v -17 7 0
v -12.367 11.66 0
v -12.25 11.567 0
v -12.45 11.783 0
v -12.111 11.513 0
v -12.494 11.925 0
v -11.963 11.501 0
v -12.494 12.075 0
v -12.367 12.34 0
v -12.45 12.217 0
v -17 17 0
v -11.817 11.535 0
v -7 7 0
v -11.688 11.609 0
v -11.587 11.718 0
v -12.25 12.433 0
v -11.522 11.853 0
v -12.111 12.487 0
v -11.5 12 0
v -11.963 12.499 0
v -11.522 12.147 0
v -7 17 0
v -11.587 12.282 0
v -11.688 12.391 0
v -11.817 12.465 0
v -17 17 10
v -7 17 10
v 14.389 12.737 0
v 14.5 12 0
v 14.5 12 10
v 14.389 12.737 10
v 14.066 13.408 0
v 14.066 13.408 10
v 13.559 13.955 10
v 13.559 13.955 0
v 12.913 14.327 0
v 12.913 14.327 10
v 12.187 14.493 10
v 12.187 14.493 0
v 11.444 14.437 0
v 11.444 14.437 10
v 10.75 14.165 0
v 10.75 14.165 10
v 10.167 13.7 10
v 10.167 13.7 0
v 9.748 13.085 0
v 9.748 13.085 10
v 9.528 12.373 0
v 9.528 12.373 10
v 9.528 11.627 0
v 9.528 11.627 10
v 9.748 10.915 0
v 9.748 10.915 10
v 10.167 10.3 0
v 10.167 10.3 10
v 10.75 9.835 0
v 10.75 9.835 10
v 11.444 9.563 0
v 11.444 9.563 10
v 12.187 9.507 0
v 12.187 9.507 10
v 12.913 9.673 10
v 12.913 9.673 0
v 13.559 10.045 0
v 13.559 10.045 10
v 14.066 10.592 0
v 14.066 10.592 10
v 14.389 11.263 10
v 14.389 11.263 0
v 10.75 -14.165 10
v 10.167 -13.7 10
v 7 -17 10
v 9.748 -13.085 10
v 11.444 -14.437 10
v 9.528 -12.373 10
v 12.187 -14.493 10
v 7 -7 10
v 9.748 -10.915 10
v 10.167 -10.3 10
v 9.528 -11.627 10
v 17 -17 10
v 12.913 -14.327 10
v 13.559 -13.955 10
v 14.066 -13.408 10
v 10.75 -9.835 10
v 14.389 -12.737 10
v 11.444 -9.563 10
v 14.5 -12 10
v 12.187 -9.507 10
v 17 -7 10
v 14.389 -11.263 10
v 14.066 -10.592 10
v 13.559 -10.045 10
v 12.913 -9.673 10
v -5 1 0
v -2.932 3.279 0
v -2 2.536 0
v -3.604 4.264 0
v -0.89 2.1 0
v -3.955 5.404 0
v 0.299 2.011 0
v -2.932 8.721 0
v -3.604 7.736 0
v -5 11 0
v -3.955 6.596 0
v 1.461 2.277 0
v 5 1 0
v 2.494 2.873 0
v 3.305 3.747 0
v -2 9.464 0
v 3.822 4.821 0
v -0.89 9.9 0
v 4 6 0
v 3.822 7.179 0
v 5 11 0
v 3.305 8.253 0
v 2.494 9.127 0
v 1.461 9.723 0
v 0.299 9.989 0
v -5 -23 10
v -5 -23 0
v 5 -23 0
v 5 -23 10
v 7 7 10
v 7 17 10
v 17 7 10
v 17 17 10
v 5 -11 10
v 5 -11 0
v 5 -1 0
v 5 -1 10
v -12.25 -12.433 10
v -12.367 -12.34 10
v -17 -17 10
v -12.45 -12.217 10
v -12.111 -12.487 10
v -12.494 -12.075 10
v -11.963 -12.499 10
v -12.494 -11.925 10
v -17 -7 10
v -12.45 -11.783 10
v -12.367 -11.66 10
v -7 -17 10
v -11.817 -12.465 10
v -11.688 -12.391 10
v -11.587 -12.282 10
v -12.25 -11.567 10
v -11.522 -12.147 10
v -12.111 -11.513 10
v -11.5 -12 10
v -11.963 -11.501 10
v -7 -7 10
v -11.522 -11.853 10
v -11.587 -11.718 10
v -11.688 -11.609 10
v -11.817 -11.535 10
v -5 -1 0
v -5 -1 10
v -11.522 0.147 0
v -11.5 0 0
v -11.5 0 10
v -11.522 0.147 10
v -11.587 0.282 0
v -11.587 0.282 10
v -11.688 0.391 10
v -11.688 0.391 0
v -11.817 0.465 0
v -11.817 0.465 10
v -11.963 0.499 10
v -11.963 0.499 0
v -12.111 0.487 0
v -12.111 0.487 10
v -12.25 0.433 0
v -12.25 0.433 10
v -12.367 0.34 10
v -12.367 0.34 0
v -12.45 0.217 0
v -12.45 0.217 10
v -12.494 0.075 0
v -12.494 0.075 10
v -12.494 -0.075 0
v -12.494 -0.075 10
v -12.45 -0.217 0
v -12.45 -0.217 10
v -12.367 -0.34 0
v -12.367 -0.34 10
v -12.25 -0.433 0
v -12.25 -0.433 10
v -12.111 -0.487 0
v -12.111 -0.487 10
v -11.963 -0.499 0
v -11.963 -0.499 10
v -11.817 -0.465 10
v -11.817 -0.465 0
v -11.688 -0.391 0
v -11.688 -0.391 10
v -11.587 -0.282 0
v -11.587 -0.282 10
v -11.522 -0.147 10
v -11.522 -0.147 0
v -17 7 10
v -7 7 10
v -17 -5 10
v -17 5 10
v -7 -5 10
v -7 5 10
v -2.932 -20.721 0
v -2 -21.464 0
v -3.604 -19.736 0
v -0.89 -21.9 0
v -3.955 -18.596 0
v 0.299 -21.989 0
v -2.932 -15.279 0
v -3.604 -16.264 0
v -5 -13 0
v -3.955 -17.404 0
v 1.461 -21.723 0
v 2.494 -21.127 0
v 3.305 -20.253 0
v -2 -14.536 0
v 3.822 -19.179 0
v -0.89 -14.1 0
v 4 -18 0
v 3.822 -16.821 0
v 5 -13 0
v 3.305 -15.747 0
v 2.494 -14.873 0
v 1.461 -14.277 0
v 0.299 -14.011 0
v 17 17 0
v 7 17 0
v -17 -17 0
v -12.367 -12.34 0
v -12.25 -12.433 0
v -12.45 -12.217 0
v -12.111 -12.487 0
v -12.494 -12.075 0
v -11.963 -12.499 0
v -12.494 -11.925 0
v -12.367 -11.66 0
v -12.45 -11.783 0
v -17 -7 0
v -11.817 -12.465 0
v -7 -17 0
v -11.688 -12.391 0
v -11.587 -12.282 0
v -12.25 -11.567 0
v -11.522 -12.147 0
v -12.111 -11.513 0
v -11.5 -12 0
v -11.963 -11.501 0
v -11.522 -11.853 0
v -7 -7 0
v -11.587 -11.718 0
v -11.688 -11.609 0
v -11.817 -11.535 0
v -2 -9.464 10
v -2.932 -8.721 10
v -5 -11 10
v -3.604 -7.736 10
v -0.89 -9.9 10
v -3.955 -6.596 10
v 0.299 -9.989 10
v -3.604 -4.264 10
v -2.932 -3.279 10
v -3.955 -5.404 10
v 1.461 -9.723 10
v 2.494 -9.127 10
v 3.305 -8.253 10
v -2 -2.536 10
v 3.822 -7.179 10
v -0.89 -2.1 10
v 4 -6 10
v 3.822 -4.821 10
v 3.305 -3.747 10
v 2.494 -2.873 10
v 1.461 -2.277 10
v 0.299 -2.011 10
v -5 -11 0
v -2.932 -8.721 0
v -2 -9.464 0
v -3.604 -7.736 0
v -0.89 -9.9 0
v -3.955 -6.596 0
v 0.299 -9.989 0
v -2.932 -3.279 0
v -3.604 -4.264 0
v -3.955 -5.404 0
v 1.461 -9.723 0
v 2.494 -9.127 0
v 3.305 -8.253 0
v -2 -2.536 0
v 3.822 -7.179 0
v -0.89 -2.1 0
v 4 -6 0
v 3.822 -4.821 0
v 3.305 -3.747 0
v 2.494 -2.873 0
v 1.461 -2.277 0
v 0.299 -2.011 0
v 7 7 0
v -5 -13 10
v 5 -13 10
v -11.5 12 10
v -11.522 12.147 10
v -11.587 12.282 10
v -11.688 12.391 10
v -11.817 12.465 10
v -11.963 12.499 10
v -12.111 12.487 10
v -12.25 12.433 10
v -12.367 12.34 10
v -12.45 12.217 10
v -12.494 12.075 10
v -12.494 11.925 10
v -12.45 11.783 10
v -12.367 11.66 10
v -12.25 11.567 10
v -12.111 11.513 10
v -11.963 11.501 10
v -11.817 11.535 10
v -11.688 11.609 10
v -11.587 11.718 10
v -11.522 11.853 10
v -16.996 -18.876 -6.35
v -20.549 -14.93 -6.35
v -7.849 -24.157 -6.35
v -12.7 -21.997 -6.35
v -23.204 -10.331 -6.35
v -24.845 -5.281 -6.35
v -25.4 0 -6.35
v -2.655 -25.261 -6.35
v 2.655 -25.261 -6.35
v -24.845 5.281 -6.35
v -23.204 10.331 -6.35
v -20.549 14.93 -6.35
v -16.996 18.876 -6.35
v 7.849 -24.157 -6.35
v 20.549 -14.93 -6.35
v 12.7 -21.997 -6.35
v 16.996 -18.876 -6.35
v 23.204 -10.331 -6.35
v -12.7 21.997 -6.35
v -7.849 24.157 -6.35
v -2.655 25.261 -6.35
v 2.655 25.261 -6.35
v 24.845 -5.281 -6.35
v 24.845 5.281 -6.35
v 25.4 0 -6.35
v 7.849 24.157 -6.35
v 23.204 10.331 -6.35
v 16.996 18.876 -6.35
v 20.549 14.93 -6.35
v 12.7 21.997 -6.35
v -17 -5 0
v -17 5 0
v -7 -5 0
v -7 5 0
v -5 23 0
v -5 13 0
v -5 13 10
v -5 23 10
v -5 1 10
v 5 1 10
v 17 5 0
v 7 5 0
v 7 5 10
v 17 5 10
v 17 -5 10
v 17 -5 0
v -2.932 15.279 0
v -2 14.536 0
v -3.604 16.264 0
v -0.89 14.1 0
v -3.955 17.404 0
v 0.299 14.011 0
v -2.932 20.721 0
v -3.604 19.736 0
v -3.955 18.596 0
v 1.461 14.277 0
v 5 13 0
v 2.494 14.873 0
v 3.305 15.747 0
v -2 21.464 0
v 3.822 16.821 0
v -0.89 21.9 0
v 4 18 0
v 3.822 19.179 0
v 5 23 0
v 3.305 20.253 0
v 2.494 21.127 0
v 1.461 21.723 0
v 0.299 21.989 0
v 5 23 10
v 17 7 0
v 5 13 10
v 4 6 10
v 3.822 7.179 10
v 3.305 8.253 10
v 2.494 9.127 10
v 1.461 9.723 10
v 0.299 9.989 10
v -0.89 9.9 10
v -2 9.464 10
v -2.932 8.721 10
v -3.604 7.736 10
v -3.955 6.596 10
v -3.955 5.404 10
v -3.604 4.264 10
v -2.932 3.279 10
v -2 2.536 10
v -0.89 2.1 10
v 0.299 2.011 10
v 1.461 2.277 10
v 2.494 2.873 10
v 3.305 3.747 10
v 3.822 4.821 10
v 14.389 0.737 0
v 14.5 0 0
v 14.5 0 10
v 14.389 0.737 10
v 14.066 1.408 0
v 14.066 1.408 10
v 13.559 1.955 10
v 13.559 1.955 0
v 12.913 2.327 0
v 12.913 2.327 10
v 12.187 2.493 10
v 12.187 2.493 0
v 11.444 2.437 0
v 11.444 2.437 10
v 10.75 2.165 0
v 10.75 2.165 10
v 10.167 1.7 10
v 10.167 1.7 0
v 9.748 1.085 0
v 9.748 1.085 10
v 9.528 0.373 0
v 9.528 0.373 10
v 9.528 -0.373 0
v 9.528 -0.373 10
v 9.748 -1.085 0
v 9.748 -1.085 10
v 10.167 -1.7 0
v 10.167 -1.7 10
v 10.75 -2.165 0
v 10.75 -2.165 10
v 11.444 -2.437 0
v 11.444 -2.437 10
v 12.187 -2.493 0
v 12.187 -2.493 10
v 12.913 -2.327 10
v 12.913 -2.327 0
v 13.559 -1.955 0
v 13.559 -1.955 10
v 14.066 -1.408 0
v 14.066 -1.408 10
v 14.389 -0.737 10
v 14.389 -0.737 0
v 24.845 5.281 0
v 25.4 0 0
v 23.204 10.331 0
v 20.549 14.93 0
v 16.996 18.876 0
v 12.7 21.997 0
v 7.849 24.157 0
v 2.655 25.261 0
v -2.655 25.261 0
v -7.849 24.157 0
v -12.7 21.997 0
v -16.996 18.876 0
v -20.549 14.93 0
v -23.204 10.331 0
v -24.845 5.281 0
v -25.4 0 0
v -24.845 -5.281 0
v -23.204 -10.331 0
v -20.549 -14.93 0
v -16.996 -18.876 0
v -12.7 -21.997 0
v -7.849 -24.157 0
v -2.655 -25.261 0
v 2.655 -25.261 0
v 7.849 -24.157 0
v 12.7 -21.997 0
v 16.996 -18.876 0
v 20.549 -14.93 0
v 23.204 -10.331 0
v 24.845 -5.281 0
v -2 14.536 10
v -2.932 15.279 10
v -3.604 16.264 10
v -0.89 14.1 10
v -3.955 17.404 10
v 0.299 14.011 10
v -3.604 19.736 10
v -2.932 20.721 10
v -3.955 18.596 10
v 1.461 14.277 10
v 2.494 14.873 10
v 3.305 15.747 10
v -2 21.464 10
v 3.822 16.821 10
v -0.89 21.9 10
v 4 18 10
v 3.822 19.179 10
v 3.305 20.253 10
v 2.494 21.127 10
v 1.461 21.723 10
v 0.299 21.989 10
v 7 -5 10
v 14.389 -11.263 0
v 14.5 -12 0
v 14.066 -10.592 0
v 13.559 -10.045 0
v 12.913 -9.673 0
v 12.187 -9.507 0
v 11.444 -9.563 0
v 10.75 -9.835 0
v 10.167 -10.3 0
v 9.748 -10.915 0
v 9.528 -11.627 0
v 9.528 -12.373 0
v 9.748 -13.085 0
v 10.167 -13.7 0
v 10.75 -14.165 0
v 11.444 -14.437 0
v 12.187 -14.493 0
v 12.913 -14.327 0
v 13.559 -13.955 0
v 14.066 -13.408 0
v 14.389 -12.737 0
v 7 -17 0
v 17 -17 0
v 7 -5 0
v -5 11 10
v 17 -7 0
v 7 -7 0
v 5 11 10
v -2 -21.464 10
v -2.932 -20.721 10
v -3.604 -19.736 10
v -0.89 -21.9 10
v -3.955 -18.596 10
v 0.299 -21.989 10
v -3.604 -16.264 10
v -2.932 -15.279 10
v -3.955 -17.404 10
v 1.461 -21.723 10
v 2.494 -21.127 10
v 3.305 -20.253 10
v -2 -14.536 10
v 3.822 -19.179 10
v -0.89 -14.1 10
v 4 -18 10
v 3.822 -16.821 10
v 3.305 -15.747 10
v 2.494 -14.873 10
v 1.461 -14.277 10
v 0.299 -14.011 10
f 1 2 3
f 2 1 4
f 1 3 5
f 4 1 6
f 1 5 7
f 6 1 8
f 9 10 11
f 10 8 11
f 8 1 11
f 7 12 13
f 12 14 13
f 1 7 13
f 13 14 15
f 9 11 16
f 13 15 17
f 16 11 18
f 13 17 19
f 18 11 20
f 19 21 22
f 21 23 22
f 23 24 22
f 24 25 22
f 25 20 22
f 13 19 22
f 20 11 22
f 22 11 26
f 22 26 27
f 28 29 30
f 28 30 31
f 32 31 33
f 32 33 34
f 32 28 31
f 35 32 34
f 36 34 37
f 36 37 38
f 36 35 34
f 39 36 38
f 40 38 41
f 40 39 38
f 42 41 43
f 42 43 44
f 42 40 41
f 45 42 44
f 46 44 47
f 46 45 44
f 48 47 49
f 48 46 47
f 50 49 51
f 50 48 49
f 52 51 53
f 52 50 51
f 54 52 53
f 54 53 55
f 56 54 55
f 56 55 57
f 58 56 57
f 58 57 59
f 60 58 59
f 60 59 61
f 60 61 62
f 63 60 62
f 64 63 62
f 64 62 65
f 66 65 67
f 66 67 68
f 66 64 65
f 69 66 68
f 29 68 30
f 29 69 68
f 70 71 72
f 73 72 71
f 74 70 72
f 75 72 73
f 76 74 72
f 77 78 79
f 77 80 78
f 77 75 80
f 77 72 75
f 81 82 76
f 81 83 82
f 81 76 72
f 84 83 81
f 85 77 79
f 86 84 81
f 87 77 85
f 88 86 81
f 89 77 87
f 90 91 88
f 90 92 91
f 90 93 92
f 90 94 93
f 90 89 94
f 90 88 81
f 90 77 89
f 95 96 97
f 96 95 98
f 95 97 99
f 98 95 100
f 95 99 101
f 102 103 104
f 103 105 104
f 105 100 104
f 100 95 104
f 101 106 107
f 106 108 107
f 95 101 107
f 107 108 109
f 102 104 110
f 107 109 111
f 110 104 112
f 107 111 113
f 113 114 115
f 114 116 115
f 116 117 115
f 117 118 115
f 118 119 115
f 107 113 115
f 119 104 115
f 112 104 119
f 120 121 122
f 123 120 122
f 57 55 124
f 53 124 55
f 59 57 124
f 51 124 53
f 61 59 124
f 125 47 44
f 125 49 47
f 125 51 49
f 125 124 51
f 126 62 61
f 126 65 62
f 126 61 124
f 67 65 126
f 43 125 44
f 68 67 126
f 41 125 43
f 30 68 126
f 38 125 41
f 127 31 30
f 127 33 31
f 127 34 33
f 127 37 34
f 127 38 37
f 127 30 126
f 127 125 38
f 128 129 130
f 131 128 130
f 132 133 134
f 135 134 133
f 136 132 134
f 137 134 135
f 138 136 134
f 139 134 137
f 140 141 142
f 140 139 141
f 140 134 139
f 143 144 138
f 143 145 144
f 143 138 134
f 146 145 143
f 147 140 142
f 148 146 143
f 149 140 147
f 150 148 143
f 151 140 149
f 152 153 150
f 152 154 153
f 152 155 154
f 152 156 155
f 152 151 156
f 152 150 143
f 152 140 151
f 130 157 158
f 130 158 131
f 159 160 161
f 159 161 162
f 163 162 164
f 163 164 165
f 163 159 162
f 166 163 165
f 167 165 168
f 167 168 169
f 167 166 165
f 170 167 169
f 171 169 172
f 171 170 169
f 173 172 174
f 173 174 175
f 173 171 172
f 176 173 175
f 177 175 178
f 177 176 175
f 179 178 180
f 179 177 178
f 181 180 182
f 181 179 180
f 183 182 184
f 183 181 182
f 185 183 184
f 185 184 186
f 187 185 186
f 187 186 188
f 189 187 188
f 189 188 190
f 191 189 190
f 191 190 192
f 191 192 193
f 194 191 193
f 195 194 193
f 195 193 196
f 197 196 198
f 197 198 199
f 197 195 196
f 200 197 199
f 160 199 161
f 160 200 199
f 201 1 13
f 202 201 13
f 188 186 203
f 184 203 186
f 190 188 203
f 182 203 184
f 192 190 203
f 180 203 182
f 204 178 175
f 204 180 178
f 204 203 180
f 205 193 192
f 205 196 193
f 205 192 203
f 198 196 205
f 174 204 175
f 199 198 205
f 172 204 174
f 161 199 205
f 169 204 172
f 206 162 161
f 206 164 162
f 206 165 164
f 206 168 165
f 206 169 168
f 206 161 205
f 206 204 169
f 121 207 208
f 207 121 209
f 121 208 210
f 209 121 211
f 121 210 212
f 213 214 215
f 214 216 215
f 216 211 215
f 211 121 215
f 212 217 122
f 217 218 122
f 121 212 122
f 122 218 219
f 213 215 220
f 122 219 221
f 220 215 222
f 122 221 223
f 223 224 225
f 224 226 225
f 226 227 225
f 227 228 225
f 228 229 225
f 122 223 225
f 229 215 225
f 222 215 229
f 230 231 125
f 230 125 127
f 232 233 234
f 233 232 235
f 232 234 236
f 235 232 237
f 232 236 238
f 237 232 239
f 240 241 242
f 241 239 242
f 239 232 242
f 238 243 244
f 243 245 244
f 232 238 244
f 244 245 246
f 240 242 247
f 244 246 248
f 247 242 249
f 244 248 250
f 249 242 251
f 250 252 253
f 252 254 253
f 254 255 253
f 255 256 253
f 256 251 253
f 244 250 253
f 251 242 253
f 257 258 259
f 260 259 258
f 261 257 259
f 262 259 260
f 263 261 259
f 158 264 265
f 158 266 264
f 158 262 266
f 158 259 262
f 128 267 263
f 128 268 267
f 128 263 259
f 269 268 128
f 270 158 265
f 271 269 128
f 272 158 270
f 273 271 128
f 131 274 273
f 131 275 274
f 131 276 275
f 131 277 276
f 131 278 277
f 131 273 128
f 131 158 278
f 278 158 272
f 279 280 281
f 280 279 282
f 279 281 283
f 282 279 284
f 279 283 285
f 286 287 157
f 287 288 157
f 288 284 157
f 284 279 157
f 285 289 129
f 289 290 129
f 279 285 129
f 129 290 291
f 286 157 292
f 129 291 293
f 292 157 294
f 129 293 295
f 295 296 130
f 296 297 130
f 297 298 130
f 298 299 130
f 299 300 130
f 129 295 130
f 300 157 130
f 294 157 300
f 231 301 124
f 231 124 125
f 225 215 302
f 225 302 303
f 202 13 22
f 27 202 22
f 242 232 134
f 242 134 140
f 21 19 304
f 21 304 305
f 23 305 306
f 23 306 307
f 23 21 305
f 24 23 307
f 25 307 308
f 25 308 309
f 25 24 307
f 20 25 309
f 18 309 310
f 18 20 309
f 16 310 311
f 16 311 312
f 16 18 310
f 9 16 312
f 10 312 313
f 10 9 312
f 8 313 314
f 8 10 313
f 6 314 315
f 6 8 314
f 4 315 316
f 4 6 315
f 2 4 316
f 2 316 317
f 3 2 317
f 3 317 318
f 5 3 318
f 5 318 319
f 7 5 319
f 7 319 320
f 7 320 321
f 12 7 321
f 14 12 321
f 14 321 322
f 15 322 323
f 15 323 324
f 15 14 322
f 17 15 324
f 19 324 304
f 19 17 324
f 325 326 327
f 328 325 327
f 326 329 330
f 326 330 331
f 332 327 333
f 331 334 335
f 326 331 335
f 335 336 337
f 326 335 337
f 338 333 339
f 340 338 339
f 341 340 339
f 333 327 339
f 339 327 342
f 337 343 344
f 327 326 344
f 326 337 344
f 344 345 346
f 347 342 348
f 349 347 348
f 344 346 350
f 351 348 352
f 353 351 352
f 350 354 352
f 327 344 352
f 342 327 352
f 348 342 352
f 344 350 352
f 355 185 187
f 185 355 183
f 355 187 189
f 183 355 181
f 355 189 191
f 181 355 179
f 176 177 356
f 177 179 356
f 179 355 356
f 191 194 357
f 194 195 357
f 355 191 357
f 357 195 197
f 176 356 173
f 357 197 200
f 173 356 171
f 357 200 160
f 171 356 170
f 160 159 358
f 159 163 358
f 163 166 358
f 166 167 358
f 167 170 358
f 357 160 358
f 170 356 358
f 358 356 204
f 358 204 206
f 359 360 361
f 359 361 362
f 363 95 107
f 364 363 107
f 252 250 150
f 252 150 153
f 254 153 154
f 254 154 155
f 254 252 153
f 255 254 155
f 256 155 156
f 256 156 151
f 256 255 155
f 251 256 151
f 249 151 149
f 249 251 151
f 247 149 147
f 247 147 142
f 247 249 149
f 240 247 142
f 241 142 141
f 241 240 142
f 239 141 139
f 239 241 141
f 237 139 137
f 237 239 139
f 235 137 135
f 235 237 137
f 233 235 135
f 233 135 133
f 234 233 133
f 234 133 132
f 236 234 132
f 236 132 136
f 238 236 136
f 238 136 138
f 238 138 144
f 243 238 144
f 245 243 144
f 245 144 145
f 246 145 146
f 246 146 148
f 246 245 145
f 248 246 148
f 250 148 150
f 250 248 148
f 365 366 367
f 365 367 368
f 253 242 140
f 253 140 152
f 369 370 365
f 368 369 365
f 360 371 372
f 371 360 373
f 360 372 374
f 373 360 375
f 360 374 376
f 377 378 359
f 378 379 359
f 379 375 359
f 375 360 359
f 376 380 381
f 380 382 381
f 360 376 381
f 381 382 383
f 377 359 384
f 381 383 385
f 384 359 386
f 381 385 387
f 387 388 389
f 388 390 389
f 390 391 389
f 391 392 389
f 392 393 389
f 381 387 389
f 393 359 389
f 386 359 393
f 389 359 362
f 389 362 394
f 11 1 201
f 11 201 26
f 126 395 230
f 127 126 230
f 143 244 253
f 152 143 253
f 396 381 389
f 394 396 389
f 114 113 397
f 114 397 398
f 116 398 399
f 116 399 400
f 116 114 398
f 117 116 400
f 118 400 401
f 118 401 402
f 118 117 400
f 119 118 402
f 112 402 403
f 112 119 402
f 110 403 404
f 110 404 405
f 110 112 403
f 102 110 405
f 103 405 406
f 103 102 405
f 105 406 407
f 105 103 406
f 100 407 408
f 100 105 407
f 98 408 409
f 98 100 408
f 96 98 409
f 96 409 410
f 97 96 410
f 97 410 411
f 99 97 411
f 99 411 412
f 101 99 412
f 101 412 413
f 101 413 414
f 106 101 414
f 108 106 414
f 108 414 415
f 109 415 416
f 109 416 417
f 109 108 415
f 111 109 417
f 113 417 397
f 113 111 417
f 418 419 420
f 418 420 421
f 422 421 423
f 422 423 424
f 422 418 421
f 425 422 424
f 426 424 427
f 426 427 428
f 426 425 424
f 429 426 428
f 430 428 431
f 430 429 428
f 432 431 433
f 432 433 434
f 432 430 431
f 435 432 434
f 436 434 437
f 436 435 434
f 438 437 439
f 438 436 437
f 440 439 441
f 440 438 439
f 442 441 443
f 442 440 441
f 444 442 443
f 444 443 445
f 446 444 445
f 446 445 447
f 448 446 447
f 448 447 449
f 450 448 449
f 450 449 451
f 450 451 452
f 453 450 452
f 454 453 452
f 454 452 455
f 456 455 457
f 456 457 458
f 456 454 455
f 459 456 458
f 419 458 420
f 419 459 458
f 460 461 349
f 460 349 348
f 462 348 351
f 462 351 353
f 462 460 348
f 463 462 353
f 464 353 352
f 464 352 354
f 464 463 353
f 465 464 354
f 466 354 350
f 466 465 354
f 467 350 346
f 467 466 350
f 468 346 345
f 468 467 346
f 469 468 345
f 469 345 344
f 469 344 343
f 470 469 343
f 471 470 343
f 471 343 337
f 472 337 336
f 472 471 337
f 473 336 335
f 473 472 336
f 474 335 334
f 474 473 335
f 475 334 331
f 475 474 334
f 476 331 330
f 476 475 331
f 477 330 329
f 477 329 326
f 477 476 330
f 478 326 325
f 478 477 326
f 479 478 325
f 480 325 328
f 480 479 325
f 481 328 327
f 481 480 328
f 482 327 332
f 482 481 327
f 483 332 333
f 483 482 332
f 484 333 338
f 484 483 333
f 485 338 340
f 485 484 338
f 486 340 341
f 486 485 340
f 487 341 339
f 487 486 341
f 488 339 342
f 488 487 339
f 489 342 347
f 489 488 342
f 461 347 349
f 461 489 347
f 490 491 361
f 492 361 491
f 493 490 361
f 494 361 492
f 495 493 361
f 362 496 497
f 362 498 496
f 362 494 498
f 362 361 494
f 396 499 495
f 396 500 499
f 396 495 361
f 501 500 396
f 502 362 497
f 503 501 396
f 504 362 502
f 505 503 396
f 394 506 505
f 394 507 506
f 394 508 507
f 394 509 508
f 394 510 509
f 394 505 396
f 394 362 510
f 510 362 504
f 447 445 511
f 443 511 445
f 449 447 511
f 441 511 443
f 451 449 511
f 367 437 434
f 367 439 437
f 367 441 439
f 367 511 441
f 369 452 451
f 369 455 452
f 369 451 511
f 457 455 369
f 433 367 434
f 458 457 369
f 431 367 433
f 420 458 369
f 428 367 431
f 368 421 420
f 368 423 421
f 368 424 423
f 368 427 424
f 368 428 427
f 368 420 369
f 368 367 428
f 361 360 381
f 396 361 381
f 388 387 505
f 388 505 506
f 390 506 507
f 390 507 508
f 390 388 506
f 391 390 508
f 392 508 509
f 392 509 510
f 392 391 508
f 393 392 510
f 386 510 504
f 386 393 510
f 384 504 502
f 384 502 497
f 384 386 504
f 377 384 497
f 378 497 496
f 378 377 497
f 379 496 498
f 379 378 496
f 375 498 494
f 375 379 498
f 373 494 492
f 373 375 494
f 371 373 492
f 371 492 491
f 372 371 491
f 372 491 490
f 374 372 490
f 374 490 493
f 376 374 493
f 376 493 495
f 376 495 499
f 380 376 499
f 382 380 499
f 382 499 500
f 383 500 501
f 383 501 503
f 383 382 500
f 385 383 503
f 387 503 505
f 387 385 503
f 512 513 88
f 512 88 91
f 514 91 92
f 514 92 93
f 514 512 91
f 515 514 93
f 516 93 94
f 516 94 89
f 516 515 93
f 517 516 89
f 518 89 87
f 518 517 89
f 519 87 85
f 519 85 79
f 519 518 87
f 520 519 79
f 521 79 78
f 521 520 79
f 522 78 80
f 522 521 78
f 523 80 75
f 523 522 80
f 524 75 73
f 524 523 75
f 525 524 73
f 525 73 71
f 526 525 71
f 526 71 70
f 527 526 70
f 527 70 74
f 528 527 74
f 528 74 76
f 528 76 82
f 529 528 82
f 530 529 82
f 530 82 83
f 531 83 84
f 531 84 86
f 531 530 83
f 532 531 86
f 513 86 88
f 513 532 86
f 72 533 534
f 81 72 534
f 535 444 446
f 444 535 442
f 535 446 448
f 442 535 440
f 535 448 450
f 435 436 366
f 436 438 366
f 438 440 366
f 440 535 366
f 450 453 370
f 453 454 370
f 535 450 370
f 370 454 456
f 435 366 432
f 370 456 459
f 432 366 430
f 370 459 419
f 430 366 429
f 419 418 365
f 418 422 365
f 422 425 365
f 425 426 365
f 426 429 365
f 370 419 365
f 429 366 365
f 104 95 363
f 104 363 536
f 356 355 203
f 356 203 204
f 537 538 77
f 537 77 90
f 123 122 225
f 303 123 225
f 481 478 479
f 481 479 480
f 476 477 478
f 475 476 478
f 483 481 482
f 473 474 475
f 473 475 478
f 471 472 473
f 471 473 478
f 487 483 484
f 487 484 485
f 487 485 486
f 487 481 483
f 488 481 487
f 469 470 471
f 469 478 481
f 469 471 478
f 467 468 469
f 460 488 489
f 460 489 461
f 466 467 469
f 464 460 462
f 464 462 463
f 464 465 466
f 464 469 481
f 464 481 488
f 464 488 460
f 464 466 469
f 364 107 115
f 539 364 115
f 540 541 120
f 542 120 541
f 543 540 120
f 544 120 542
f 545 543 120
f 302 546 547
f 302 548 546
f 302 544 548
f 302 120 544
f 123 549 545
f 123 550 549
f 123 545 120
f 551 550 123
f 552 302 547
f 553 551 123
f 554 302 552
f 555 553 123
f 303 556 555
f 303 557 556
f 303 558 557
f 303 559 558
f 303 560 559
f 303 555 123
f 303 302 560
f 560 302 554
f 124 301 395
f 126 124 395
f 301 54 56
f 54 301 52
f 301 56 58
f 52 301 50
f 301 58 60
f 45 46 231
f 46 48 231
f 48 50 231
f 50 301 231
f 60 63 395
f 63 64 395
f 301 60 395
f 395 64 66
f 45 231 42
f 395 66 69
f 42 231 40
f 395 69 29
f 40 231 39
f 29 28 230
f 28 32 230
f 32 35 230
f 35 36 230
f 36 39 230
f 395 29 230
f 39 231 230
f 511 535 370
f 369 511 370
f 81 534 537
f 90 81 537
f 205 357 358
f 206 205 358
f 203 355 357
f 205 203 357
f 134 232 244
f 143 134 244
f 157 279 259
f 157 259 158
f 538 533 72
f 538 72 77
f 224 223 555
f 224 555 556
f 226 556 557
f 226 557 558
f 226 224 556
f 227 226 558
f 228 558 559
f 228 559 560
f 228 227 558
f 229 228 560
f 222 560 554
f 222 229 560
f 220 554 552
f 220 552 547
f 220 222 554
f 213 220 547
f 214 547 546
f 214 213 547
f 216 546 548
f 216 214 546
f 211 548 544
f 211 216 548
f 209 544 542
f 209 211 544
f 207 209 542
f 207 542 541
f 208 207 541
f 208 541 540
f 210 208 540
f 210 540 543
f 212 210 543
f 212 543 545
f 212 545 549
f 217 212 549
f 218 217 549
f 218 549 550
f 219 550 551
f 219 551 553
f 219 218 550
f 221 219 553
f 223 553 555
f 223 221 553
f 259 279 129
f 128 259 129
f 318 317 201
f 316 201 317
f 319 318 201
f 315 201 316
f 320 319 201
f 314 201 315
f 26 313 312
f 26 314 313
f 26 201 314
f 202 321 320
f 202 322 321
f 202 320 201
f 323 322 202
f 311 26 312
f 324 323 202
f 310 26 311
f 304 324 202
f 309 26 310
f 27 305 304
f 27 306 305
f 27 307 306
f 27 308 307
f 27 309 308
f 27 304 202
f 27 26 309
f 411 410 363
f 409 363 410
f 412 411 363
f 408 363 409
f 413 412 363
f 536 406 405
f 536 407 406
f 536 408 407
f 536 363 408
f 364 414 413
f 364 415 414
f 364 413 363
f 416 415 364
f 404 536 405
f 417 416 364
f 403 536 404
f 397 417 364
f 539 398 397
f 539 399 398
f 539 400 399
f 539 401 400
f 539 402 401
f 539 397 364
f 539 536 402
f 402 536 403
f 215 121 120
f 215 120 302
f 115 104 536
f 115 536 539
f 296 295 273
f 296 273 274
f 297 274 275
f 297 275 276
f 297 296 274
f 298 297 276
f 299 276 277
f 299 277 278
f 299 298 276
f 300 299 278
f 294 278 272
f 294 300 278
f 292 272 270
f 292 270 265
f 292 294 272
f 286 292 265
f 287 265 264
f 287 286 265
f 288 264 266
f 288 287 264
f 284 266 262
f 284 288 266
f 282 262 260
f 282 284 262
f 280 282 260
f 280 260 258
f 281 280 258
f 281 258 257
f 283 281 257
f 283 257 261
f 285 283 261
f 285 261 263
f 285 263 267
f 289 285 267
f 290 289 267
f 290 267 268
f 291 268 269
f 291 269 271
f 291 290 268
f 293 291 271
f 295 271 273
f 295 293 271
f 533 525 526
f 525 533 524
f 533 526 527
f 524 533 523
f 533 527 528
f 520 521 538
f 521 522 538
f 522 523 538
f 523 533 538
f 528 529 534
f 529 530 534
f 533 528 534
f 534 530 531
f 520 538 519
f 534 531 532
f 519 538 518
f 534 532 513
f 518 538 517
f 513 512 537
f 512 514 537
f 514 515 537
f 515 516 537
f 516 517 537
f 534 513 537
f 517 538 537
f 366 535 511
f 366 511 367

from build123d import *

# Parameters (mm, degrees)
F0_R     = 25.4
F0_W     = 10
F0_H     = 10
F0_R_2   = 0.5
F0_R_3   = 4
F0_R_4   = 2.5
F1_DEPTH = 6.35
F2_DEPTH = 10


with BuildPart() as f1:
    # F0 (on Top) → F1 (new body)
    with BuildSketch(Plane.XY):
        Circle(F0_R)
        with Locations((0, -18)):
            Rectangle(F0_W, F0_H, mode=Mode.SUBTRACT)
        with Locations((-12, -12)):
            Rectangle(F0_W, F0_H, mode=Mode.SUBTRACT)
        with Locations((-12, 0)):
            Rectangle(F0_W, F0_H, mode=Mode.SUBTRACT)
        with Locations((0, -6)):
            Rectangle(F0_W, F0_H, mode=Mode.SUBTRACT)
        with Locations((12, -12)):
            Rectangle(F0_W, F0_H, mode=Mode.SUBTRACT)
        with Locations((12, 0)):
            Rectangle(F0_W, F0_H, mode=Mode.SUBTRACT)
        with Locations((0, 6)):
            Rectangle(F0_W, F0_H, mode=Mode.SUBTRACT)
        with Locations((-12, 12)):
            Rectangle(F0_W, F0_H, mode=Mode.SUBTRACT)
        with Locations((0, 18)):
            Rectangle(F0_W, F0_H, mode=Mode.SUBTRACT)
        with Locations((12, 12)):
            Rectangle(F0_W, F0_H, mode=Mode.SUBTRACT)
        with Locations((-12, -12)):
            Rectangle(F0_W, F0_H)
        with Locations((-12, -12)):
            Circle(F0_R_2, mode=Mode.SUBTRACT)
        with Locations((-12, 0)):
            Rectangle(F0_W, F0_H)
        with Locations((-12, 0)):
            Circle(F0_R_2, mode=Mode.SUBTRACT)
        with Locations((-12, 12)):
            Rectangle(F0_W, F0_H)
        with Locations((-12, 12)):
            Circle(F0_R_2, mode=Mode.SUBTRACT)
        with Locations((0, 6)):
            Rectangle(F0_W, F0_H)
        with Locations((0, 6)):
            Circle(F0_R_3, mode=Mode.SUBTRACT)
        with Locations((0, -6)):
            Rectangle(F0_W, F0_H)
        with Locations((0, -6)):
            Circle(F0_R_3, mode=Mode.SUBTRACT)
        with Locations((0, -18)):
            Rectangle(F0_W, F0_H)
        with Locations((0, -18)):
            Circle(F0_R_3, mode=Mode.SUBTRACT)
        with Locations((0, 18)):
            Rectangle(F0_W, F0_H)
        with Locations((0, 18)):
            Circle(F0_R_3, mode=Mode.SUBTRACT)
        with Locations((12, 12)):
            Rectangle(F0_W, F0_H)
        with Locations((12, 12)):
            Circle(F0_R_4, mode=Mode.SUBTRACT)
        with Locations((12, 0)):
            Rectangle(F0_W, F0_H)
        with Locations((12, 0)):
            Circle(F0_R_4, mode=Mode.SUBTRACT)
        with Locations((12, -12)):
            Rectangle(F0_W, F0_H)
        with Locations((12, -12)):
            Circle(F0_R_4, mode=Mode.SUBTRACT)
        with Locations((-12, -12)):
            Circle(F0_R_2)
        with Locations((-12, 0)):
            Circle(F0_R_2)
        with Locations((-12, 12)):
            Circle(F0_R_2)
        with Locations((0, 18)):
            Circle(F0_R_3)
        with Locations((0, 6)):
            Circle(F0_R_3)
        with Locations((0, -18)):
            Circle(F0_R_3)
        with Locations((12, -12)):
            Circle(F0_R_4)
        with Locations((12, 0)):
            Circle(F0_R_4)
        with Locations((12, 12)):
            Circle(F0_R_4)
        with Locations((0, -6)):
            Circle(F0_R_3)
    extrude(amount=-F1_DEPTH)


with BuildPart() as f2:
    # F0 (on Top) → F2 (new body)
    with BuildSketch(Plane.XY):
        with Locations((-12, 12)):
            Rectangle(F0_W, F0_H)
        with Locations((-12, 12)):
            Circle(F0_R_2, mode=Mode.SUBTRACT)
        with Locations((0, 18)):
            Rectangle(F0_W, F0_H)
        with Locations((0, 18)):
            Circle(F0_R_3, mode=Mode.SUBTRACT)
        with Locations((12, 12)):
            Rectangle(F0_W, F0_H)
        with Locations((12, 12)):
            Circle(F0_R_4, mode=Mode.SUBTRACT)
        with Locations((0, 6)):
            Rectangle(F0_W, F0_H)
        with Locations((0, 6)):
            Circle(F0_R_3, mode=Mode.SUBTRACT)
        with Locations((-12, 0)):
            Rectangle(F0_W, F0_H)
        with Locations((-12, 0)):
            Circle(F0_R_2, mode=Mode.SUBTRACT)
        with Locations((-12, -12)):
            Rectangle(F0_W, F0_H)
        with Locations((-12, -12)):
            Circle(F0_R_2, mode=Mode.SUBTRACT)
        with Locations((0, -6)):
            Rectangle(F0_W, F0_H)
        with Locations((0, -6)):
            Circle(F0_R_3, mode=Mode.SUBTRACT)
        with Locations((0, -18)):
            Rectangle(F0_W, F0_H)
        with Locations((0, -18)):
            Circle(F0_R_3, mode=Mode.SUBTRACT)
        with Locations((12, 0)):
            Rectangle(F0_W, F0_H)
        with Locations((12, 0)):
            Circle(F0_R_4, mode=Mode.SUBTRACT)
        with Locations((12, -12)):
            Rectangle(F0_W, F0_H)
        with Locations((12, -12)):
            Circle(F0_R_4, mode=Mode.SUBTRACT)
    extrude(amount=F2_DEPTH)


solid = Compound([f1.part, f2.part])
